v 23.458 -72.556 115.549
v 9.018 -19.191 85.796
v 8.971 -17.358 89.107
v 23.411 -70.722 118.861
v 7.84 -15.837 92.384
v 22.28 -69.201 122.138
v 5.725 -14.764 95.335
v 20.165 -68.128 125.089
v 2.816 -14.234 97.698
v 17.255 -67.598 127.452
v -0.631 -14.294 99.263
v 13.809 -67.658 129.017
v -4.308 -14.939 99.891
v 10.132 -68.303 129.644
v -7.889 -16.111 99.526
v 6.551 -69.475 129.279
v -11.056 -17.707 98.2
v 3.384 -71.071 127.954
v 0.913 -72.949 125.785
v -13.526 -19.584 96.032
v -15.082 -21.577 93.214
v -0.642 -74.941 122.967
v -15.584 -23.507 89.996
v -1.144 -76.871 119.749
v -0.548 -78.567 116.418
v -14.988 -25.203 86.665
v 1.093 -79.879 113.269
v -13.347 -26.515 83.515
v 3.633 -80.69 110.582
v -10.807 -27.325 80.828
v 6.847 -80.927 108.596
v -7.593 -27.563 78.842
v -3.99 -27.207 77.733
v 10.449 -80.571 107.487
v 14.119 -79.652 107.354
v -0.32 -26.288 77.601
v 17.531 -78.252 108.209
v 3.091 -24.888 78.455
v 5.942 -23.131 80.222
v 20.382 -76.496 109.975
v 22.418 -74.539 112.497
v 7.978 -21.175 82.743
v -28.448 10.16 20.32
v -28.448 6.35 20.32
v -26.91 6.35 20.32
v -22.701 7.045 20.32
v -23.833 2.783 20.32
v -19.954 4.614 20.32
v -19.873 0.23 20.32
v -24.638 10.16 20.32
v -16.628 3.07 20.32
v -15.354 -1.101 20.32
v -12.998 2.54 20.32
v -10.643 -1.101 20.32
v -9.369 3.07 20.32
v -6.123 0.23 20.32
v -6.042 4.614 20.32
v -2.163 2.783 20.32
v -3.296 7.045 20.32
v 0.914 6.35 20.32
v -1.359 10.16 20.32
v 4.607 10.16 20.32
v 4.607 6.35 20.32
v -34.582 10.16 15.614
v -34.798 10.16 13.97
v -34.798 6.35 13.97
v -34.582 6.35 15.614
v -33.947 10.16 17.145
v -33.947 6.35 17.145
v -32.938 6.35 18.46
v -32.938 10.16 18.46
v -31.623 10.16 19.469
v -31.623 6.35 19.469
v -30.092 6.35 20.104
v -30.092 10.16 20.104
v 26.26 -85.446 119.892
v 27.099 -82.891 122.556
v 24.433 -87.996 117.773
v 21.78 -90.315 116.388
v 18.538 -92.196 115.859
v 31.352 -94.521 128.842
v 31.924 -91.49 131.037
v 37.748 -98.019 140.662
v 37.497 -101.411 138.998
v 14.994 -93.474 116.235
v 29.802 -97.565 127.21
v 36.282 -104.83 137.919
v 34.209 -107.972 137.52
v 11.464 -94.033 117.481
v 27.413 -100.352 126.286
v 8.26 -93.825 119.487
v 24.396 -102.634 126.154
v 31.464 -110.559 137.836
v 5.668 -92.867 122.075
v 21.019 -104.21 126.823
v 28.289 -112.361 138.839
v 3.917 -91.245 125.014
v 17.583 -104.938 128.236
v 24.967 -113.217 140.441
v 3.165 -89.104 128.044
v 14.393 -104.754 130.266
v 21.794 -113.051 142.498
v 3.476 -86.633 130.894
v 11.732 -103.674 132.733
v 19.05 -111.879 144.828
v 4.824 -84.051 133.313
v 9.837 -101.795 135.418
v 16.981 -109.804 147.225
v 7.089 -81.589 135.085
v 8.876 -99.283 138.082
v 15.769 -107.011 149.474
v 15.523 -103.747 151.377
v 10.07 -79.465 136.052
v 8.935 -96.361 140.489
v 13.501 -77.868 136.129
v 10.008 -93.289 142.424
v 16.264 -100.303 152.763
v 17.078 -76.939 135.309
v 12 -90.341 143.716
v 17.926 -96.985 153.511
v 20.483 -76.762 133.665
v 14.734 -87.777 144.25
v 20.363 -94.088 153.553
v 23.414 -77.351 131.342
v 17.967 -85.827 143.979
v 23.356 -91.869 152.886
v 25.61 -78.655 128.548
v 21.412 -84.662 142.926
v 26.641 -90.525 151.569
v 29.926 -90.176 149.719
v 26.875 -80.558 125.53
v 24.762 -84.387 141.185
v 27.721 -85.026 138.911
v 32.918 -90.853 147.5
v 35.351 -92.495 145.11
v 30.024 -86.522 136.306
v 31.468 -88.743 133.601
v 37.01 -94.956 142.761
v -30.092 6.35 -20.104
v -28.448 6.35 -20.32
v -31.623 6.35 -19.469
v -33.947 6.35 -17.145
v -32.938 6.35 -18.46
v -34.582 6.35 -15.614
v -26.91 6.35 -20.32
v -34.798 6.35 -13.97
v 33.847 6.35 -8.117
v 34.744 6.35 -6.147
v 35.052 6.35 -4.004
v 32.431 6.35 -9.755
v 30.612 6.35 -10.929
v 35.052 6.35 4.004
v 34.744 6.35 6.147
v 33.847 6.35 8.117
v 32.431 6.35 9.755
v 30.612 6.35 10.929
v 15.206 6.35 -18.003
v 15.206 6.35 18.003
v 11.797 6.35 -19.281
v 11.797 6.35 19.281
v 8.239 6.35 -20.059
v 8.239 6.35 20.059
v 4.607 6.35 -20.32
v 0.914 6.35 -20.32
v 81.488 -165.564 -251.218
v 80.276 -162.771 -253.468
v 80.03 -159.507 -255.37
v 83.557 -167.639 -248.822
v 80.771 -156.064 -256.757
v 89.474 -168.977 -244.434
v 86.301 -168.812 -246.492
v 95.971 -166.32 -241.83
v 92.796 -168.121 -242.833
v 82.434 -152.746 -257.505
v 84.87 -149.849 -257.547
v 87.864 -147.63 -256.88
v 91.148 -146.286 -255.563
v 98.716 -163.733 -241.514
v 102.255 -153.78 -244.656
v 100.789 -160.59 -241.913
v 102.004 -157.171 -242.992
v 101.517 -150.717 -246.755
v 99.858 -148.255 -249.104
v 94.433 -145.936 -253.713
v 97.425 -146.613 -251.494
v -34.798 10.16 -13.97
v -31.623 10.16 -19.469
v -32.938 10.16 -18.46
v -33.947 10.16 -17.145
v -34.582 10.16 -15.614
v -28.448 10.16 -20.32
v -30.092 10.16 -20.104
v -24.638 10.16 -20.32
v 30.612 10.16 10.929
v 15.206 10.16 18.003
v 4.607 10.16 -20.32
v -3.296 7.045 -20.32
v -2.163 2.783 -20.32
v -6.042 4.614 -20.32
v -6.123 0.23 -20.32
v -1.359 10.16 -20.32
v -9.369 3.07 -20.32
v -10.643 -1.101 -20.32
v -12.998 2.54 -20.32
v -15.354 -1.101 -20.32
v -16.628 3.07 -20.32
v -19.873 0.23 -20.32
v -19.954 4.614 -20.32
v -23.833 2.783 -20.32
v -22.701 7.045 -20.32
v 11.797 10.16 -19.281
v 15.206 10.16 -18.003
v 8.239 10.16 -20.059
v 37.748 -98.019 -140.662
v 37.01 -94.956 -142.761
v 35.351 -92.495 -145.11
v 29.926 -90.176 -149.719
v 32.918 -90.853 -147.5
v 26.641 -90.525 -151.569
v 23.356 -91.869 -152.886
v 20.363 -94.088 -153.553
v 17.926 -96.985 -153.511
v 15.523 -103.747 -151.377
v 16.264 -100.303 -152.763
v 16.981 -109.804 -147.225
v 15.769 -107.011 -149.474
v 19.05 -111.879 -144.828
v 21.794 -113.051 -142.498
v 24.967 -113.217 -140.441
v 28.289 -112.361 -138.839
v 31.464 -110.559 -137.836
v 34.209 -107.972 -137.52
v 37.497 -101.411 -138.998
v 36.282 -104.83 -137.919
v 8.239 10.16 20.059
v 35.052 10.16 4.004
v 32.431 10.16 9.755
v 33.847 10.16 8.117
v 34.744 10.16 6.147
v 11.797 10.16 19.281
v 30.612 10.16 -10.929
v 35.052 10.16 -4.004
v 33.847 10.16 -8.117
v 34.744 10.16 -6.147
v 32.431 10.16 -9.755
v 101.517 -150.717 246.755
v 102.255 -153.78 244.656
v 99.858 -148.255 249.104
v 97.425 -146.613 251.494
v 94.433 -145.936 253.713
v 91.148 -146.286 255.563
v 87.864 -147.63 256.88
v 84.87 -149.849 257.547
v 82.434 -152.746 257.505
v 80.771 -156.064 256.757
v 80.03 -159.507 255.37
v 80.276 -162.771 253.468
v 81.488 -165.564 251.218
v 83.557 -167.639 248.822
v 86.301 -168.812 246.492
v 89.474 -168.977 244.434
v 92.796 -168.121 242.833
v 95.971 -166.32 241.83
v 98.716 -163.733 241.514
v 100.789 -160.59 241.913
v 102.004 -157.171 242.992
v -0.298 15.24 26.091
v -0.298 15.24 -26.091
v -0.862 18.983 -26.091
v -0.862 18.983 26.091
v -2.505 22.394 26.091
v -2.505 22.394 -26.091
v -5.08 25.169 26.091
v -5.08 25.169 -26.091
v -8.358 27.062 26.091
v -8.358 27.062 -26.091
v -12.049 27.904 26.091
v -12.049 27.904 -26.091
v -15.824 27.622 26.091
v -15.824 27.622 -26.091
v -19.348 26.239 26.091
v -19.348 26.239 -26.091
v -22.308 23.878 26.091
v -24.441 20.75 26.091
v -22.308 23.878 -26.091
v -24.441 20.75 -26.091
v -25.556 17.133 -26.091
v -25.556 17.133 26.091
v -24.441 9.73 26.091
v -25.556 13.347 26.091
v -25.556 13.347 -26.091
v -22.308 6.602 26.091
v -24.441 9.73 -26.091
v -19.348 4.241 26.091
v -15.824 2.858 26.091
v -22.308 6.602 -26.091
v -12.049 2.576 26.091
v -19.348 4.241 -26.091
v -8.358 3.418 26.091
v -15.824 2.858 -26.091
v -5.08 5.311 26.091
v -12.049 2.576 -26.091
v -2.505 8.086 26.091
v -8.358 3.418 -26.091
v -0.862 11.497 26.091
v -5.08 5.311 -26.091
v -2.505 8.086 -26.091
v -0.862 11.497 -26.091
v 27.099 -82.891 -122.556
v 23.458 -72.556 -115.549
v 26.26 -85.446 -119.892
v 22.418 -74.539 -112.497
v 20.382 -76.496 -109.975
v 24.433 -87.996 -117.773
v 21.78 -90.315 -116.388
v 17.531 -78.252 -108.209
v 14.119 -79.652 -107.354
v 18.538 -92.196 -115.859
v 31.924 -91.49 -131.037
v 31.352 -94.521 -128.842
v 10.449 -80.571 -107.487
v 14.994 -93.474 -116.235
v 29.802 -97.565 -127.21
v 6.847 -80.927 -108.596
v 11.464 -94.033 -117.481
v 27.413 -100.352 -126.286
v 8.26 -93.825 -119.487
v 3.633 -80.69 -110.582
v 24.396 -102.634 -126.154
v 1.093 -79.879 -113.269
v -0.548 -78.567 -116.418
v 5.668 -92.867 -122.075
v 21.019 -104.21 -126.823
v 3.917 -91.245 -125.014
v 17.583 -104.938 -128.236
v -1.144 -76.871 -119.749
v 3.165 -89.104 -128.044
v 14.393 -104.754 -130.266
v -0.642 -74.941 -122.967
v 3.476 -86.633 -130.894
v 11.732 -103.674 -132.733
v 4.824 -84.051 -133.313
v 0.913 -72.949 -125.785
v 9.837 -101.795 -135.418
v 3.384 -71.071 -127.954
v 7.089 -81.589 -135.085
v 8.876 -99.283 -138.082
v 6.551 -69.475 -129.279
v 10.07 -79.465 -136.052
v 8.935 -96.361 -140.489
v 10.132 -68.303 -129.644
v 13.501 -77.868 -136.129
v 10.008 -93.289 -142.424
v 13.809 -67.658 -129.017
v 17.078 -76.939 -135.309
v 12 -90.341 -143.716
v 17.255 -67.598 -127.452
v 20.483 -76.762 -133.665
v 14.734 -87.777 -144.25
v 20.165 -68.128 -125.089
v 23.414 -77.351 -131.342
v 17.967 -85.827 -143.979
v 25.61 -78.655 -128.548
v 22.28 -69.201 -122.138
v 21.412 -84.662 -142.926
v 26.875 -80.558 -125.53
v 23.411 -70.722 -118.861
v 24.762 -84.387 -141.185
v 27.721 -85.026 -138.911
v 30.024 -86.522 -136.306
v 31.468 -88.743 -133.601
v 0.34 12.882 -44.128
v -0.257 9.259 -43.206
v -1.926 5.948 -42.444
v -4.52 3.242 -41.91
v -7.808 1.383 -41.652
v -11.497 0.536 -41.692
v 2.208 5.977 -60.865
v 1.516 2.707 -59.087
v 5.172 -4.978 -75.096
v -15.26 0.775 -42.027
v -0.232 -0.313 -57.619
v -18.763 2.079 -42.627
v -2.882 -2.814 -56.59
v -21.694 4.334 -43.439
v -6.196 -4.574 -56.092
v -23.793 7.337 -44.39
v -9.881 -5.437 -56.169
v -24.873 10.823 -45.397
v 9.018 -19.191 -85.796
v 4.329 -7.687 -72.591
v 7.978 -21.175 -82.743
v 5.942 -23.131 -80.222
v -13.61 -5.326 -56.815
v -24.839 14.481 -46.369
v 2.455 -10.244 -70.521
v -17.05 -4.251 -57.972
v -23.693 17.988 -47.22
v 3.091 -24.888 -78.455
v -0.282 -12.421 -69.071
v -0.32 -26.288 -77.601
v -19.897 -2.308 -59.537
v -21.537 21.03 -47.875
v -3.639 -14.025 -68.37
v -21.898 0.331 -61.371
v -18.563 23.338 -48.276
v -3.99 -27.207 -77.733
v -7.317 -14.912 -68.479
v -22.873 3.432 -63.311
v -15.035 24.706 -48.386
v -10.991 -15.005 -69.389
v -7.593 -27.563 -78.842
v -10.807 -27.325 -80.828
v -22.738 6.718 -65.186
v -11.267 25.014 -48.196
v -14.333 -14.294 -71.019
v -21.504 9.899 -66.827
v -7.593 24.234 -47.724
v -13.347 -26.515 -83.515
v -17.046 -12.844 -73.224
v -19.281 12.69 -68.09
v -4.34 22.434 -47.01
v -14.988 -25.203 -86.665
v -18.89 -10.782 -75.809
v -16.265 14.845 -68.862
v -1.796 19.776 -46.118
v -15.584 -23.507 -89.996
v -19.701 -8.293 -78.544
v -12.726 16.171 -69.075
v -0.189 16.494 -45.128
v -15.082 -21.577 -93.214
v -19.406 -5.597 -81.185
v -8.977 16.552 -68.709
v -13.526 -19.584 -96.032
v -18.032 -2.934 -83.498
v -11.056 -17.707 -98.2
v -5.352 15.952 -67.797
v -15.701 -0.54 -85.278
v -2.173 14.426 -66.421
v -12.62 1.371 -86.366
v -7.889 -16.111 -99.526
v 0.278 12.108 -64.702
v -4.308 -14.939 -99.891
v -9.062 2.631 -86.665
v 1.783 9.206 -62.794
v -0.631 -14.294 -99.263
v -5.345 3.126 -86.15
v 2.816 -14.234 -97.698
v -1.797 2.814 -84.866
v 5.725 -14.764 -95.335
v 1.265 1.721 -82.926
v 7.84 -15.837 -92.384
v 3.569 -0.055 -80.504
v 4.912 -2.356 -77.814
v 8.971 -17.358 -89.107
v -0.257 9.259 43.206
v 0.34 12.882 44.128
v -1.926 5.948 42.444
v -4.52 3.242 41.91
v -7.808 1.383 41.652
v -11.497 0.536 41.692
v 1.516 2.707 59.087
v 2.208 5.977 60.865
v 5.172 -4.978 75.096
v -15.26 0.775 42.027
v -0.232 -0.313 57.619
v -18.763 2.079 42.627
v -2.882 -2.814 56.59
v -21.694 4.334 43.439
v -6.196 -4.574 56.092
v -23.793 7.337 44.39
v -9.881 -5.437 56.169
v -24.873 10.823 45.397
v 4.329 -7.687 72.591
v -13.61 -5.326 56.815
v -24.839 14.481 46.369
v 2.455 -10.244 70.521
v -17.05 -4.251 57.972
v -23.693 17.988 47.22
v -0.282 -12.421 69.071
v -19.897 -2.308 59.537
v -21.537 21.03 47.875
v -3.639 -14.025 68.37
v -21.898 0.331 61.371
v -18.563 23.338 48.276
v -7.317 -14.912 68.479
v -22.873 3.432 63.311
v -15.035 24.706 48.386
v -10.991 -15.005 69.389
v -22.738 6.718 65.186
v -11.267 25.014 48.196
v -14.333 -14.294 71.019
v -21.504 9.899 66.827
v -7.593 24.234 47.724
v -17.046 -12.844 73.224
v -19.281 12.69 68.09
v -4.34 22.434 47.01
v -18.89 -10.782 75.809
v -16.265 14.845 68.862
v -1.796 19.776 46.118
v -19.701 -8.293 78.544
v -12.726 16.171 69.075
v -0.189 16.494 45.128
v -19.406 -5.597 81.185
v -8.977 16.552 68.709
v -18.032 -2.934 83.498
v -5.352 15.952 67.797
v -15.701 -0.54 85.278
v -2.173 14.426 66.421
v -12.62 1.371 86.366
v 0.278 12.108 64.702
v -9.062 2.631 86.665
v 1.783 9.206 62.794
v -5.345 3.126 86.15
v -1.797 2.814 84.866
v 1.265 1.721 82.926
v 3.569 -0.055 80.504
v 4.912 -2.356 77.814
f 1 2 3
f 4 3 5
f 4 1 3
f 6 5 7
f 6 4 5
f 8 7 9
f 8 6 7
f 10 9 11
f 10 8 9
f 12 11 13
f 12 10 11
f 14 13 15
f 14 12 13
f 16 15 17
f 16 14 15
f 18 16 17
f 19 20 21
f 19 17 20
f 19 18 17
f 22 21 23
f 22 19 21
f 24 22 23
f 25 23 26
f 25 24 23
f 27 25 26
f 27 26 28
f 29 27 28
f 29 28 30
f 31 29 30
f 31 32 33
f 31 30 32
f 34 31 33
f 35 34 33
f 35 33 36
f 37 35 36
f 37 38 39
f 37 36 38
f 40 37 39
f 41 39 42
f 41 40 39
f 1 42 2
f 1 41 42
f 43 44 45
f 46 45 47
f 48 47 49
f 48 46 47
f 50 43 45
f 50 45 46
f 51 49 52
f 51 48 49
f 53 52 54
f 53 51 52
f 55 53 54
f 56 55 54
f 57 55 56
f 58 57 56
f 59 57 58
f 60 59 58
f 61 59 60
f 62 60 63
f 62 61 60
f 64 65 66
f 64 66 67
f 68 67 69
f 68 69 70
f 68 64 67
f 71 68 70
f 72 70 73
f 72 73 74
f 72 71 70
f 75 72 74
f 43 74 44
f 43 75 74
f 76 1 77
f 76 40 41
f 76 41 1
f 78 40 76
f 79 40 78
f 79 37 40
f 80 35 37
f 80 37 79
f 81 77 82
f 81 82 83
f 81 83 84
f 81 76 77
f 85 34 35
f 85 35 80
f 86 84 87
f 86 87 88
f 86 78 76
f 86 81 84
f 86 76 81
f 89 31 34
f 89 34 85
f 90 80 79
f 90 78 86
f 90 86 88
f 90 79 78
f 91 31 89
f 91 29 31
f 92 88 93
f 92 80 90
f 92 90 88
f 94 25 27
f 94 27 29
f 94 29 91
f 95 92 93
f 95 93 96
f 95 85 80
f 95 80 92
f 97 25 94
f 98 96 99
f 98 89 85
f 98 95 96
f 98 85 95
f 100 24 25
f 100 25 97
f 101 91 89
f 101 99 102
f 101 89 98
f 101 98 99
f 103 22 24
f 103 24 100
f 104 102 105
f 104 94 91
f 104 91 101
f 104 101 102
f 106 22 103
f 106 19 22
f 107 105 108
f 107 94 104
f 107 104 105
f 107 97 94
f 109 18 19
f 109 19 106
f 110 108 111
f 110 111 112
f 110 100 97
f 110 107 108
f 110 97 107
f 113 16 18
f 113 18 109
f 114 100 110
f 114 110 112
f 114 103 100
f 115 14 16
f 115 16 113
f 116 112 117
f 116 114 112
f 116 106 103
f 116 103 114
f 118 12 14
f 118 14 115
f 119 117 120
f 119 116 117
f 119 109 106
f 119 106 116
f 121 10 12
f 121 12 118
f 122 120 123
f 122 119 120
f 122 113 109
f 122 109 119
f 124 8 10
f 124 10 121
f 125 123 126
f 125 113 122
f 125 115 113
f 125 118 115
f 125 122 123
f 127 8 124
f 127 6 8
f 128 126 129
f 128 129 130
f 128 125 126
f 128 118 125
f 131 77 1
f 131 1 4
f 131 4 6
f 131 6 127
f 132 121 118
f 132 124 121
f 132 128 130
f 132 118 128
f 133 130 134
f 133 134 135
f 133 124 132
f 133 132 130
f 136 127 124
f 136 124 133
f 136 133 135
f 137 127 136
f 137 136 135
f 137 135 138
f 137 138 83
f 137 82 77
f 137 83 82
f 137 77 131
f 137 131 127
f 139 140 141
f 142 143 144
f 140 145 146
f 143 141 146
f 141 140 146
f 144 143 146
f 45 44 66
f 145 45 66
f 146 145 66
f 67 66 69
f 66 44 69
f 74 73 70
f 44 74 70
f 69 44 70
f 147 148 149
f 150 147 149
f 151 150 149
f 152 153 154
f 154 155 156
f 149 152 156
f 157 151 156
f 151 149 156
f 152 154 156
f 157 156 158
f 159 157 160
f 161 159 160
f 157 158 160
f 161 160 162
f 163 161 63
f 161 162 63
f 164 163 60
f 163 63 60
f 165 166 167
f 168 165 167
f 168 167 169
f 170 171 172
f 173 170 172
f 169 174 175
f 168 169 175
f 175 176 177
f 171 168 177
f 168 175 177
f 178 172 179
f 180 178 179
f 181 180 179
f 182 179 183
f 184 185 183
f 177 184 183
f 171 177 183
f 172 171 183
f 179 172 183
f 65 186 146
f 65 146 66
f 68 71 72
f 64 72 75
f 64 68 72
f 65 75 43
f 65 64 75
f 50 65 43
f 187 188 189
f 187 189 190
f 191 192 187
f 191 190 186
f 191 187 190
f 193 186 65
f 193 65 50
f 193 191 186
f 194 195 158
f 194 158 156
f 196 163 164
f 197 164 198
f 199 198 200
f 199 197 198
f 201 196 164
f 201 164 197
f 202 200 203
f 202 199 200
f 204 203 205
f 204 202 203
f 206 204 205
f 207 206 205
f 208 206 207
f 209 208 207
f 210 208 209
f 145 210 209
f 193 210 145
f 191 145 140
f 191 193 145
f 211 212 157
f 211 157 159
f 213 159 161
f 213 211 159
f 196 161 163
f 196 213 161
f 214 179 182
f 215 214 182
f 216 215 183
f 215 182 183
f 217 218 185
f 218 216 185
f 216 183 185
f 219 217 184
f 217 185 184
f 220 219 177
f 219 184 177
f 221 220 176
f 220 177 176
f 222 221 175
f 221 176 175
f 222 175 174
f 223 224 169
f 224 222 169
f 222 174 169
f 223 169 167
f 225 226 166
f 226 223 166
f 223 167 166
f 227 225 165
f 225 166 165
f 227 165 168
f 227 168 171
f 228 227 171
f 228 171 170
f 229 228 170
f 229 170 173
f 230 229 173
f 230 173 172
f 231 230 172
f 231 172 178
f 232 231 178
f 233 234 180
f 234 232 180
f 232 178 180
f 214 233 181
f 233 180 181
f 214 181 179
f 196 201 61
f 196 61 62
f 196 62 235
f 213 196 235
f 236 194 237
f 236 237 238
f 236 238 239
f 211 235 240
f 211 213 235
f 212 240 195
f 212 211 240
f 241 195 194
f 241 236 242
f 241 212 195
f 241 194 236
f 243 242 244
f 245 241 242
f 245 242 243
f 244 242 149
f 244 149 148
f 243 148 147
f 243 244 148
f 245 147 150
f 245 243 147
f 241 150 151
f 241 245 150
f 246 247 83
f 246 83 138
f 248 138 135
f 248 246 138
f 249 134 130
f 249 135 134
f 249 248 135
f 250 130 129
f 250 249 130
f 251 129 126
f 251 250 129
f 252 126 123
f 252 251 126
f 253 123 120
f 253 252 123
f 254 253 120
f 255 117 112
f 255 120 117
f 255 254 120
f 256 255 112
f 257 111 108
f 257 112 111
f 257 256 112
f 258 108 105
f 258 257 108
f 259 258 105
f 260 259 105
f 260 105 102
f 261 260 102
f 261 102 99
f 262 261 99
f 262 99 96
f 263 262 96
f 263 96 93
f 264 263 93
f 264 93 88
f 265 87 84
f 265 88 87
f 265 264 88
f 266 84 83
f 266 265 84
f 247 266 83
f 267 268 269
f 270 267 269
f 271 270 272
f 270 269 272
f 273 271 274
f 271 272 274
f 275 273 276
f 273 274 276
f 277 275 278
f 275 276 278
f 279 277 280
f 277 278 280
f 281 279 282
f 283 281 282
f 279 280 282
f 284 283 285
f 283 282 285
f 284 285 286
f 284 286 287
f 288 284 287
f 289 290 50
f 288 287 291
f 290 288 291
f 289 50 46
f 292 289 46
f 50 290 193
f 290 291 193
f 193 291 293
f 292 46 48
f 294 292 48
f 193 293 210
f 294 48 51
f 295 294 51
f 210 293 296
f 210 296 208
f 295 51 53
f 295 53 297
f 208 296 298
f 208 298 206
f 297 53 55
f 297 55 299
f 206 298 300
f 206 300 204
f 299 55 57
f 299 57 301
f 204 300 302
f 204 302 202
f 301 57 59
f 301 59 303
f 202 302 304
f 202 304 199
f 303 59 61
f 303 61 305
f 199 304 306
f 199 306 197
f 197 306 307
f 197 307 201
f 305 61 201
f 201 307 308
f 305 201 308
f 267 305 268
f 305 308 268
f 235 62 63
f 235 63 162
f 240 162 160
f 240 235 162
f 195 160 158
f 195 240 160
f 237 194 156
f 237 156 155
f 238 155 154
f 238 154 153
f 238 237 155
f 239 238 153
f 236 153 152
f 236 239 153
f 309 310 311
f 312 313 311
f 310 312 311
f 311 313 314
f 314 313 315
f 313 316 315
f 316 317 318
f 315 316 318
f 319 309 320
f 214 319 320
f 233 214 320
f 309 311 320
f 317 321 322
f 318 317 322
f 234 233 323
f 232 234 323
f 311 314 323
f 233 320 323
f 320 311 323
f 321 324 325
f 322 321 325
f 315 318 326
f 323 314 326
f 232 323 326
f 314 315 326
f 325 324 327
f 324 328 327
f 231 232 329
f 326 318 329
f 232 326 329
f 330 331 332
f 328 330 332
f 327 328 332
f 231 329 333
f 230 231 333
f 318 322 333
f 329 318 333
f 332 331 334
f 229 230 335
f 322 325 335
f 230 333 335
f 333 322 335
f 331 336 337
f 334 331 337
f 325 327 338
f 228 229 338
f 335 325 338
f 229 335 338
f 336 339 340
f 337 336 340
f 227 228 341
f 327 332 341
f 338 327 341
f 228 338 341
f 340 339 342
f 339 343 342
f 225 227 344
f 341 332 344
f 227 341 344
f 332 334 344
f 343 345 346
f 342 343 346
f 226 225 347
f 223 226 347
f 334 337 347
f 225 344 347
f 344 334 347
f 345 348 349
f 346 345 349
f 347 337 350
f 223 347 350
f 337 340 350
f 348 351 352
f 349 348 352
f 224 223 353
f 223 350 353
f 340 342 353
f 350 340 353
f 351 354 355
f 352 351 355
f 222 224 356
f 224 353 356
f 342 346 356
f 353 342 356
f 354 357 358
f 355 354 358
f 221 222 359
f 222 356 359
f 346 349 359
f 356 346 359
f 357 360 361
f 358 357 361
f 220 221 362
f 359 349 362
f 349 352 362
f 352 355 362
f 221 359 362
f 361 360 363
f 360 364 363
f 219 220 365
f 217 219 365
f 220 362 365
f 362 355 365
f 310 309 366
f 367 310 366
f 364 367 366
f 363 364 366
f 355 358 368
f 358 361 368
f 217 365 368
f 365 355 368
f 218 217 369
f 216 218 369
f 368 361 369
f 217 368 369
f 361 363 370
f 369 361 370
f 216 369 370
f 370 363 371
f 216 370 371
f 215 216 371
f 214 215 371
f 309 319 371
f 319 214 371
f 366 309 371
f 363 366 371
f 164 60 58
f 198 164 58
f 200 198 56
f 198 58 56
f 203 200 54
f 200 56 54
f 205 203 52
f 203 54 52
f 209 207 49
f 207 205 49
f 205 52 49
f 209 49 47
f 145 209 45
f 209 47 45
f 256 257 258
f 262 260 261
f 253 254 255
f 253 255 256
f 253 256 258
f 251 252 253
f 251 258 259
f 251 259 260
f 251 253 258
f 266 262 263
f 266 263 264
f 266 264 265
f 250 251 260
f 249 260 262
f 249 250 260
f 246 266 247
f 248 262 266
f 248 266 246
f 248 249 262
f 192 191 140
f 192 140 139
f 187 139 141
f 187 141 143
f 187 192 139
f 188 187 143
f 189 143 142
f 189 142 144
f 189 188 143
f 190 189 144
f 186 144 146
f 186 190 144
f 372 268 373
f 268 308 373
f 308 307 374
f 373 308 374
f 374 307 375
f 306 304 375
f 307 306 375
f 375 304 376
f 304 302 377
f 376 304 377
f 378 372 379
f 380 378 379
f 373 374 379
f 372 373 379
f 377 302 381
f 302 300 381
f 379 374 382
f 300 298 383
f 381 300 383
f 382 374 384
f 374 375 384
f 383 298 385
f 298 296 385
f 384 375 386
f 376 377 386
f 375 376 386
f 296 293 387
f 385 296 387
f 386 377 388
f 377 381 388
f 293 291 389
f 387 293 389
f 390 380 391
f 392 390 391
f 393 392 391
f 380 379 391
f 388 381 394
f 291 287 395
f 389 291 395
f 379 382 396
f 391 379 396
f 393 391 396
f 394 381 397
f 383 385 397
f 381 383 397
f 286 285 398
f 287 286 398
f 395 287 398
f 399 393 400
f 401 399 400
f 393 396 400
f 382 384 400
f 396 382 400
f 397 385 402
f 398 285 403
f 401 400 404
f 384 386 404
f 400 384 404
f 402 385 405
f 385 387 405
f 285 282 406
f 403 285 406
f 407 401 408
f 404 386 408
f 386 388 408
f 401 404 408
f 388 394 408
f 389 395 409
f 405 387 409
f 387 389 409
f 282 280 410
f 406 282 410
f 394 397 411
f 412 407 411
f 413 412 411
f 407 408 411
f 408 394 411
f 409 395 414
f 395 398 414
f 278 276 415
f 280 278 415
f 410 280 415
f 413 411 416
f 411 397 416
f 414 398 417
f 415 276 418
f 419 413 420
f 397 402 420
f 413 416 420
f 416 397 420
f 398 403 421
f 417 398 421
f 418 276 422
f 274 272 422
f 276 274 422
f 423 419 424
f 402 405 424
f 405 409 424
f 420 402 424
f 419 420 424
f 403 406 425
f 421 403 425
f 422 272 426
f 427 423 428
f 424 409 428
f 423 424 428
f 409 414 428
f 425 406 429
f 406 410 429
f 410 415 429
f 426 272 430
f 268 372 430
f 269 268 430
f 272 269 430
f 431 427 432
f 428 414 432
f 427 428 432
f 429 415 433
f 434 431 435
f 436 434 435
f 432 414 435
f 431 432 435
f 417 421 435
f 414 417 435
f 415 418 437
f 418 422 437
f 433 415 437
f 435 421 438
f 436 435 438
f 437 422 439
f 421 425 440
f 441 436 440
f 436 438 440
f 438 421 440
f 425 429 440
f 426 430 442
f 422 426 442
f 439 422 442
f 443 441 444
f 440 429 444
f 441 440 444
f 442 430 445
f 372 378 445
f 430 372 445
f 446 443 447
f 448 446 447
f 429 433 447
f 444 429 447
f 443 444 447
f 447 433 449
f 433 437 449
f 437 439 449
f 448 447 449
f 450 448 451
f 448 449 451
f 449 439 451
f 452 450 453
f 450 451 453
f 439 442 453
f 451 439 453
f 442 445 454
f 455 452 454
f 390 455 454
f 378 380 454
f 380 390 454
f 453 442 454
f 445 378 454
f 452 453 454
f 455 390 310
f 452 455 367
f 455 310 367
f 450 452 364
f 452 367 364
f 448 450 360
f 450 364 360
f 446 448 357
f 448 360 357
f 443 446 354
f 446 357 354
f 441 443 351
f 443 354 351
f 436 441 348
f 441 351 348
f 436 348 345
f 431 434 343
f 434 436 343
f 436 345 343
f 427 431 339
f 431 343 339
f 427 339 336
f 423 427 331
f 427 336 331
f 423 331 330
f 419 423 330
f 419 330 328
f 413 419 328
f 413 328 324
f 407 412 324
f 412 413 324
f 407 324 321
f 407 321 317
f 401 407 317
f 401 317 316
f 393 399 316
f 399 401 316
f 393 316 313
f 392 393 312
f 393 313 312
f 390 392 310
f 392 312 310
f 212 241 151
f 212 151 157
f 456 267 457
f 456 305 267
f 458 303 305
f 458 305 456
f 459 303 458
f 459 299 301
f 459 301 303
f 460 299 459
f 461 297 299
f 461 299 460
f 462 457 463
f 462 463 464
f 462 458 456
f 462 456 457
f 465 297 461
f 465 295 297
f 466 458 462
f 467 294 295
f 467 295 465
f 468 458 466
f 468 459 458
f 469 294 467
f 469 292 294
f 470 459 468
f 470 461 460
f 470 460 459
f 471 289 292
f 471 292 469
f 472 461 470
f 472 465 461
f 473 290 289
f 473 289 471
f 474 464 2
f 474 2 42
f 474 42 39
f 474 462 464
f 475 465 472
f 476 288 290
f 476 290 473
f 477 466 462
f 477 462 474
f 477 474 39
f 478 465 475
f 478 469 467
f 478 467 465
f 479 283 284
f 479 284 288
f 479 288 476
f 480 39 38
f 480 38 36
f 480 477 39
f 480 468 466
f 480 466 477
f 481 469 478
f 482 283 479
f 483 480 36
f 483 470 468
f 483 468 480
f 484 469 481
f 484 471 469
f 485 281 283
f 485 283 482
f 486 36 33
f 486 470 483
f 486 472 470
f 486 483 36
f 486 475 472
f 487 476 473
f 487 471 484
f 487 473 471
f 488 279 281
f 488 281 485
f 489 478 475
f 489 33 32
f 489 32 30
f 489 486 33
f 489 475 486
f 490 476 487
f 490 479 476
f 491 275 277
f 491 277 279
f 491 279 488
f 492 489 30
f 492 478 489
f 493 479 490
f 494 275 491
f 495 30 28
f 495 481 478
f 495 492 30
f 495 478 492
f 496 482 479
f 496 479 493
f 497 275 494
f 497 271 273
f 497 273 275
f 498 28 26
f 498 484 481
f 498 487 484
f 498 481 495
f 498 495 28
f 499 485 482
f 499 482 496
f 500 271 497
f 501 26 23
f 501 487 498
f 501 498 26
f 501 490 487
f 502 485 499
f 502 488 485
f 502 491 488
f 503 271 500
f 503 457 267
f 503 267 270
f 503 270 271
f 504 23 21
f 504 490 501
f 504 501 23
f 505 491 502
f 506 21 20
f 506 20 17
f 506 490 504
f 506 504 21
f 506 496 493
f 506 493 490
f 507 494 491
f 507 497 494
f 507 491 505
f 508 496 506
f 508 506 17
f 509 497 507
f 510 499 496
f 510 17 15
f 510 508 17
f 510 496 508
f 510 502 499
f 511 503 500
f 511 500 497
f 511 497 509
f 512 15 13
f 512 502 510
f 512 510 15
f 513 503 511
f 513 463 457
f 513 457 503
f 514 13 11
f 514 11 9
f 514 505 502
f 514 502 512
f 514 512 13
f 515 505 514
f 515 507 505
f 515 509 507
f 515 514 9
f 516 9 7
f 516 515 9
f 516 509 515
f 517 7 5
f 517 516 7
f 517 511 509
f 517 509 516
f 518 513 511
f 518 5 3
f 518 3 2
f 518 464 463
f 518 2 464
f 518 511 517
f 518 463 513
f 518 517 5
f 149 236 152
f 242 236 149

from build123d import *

# Parameters (mm, degrees)
BOSS_EXTRUDE1_DEPTH = 10.16
SKETCH2_OUTSIDE_W   = 88.516
SKETCH2_OUTSIDE_H   = 38.986
CUT_EXTRUDE1_DEPTH  = 41.64
SKETCH3_R           = 12.7


with BuildPart() as part:
    # Sketch1 → Boss-Extrude1 (new body, symmetric)
    with BuildSketch(Plane(origin=(0, 0, 0), x_dir=(1, 0, 0), z_dir=(0, 1, 0))):
        with BuildLine():
            Line((4.607085175, 20.32), (-28.448, 20.32))
            ThreePointArc((-28.448, 20.32), (-32.938128061, 18.460128061), (-34.798, 13.97))
            Line((-34.798, 13.97), (-34.798, -13.97))
            ThreePointArc((-34.798, -13.97), (-32.938128061, -18.460128061), (-28.448, -20.32))
            Line((-28.448, -20.32), (4.607085175, -20.32))
            ThreePointArc((4.607085175, -20.32), (10.031876423, -19.733940435), (15.206332963, -18.002806293))
            Line((15.206332963, -18.002806293), (30.611774336, -10.928879131))
            ThreePointArc((30.611774336, -10.928879131), (33.846603668, -8.117096905), (35.052, -4.004037244))
            Line((35.052, -4.004037244), (35.052, 4.004037244))
            ThreePointArc((35.052, 4.004037244), (33.846603668, 8.117096905), (30.611774336, 10.928879131))
            Line((30.611774336, 10.928879131), (15.206332963, 18.002806293))
            ThreePointArc((15.206332963, 18.002806293), (10.031876423, 19.733940435), (4.607085175, 20.32))
        make_face()
    extrude(amount=BOSS_EXTRUDE1_DEPTH, both=True)

    # Sketch2 outside → Cut-Extrude1 (cut, through all)
    with BuildSketch(Plane.XY.offset(20.32)):
        with Locations((0.127, 0)):
            Rectangle(SKETCH2_OUTSIDE_W, SKETCH2_OUTSIDE_H)
        with BuildLine():
            Line((-34.798, 10.16), (-24.638, 10.16))
            ThreePointArc((-24.638, 10.16), (-12.998257735, 2.54), (-1.35851547, 10.16))
            Line((-1.35851547, 10.16), (35.052, 10.16))
            Line((35.052, 10.16), (35.052, 6.35))
            Line((35.052, 6.35), (0.913895226, 6.35))
            ThreePointArc((0.913895226, 6.35), (-12.998257735, -1.27), (-26.910410695, 6.35))
            Line((-26.910410695, 6.35), (-34.798, 6.35))
            Line((-34.798, 6.35), (-34.798, 10.16))
        make_face(mode=Mode.SUBTRACT)
    extrude(amount=-CUT_EXTRUDE1_DEPTH, mode=Mode.SUBTRACT)

    # Sweep1: sweep along a curve in space
    with BuildLine() as sweep1_path:
        Line((-12.998257735, 15.24, 0), (-12.998257735, 15.24, 26.090581637))
        ThreePointArc((-12.998257735, 15.24, 26.090581637), (-10.369052155, 5.523370683, 62.566204639), (-3.225691511, -20.876005608, 88.716577691))
        Line((-3.225691511, -20.876005608, 88.716577691), (11.214051911, -74.240274777, 118.469971898))
        ThreePointArc((26.634638374, -101.71962206, 145.570889864), (17.598298945, -90.292217187, 130.430402583), (11.214051911, -74.240274777, 118.469971898))
        Line((26.634638374, -101.71962206, 145.570889864), (91.141742265, -157.48, 249.564780828))
    # Sketch3 → Sweep1 (sweep)
    with BuildSketch(Plane.XY):
        with Locations((-12.998257735, 15.24)):
            Circle(SKETCH3_R)
    sweep(path=sweep1_path.line)

    # Mirror1: part across plane


with BuildPart() as part_1:
    add(part.part)
    add(part.part.mirror(Plane.XY))


solid = part_1.part
